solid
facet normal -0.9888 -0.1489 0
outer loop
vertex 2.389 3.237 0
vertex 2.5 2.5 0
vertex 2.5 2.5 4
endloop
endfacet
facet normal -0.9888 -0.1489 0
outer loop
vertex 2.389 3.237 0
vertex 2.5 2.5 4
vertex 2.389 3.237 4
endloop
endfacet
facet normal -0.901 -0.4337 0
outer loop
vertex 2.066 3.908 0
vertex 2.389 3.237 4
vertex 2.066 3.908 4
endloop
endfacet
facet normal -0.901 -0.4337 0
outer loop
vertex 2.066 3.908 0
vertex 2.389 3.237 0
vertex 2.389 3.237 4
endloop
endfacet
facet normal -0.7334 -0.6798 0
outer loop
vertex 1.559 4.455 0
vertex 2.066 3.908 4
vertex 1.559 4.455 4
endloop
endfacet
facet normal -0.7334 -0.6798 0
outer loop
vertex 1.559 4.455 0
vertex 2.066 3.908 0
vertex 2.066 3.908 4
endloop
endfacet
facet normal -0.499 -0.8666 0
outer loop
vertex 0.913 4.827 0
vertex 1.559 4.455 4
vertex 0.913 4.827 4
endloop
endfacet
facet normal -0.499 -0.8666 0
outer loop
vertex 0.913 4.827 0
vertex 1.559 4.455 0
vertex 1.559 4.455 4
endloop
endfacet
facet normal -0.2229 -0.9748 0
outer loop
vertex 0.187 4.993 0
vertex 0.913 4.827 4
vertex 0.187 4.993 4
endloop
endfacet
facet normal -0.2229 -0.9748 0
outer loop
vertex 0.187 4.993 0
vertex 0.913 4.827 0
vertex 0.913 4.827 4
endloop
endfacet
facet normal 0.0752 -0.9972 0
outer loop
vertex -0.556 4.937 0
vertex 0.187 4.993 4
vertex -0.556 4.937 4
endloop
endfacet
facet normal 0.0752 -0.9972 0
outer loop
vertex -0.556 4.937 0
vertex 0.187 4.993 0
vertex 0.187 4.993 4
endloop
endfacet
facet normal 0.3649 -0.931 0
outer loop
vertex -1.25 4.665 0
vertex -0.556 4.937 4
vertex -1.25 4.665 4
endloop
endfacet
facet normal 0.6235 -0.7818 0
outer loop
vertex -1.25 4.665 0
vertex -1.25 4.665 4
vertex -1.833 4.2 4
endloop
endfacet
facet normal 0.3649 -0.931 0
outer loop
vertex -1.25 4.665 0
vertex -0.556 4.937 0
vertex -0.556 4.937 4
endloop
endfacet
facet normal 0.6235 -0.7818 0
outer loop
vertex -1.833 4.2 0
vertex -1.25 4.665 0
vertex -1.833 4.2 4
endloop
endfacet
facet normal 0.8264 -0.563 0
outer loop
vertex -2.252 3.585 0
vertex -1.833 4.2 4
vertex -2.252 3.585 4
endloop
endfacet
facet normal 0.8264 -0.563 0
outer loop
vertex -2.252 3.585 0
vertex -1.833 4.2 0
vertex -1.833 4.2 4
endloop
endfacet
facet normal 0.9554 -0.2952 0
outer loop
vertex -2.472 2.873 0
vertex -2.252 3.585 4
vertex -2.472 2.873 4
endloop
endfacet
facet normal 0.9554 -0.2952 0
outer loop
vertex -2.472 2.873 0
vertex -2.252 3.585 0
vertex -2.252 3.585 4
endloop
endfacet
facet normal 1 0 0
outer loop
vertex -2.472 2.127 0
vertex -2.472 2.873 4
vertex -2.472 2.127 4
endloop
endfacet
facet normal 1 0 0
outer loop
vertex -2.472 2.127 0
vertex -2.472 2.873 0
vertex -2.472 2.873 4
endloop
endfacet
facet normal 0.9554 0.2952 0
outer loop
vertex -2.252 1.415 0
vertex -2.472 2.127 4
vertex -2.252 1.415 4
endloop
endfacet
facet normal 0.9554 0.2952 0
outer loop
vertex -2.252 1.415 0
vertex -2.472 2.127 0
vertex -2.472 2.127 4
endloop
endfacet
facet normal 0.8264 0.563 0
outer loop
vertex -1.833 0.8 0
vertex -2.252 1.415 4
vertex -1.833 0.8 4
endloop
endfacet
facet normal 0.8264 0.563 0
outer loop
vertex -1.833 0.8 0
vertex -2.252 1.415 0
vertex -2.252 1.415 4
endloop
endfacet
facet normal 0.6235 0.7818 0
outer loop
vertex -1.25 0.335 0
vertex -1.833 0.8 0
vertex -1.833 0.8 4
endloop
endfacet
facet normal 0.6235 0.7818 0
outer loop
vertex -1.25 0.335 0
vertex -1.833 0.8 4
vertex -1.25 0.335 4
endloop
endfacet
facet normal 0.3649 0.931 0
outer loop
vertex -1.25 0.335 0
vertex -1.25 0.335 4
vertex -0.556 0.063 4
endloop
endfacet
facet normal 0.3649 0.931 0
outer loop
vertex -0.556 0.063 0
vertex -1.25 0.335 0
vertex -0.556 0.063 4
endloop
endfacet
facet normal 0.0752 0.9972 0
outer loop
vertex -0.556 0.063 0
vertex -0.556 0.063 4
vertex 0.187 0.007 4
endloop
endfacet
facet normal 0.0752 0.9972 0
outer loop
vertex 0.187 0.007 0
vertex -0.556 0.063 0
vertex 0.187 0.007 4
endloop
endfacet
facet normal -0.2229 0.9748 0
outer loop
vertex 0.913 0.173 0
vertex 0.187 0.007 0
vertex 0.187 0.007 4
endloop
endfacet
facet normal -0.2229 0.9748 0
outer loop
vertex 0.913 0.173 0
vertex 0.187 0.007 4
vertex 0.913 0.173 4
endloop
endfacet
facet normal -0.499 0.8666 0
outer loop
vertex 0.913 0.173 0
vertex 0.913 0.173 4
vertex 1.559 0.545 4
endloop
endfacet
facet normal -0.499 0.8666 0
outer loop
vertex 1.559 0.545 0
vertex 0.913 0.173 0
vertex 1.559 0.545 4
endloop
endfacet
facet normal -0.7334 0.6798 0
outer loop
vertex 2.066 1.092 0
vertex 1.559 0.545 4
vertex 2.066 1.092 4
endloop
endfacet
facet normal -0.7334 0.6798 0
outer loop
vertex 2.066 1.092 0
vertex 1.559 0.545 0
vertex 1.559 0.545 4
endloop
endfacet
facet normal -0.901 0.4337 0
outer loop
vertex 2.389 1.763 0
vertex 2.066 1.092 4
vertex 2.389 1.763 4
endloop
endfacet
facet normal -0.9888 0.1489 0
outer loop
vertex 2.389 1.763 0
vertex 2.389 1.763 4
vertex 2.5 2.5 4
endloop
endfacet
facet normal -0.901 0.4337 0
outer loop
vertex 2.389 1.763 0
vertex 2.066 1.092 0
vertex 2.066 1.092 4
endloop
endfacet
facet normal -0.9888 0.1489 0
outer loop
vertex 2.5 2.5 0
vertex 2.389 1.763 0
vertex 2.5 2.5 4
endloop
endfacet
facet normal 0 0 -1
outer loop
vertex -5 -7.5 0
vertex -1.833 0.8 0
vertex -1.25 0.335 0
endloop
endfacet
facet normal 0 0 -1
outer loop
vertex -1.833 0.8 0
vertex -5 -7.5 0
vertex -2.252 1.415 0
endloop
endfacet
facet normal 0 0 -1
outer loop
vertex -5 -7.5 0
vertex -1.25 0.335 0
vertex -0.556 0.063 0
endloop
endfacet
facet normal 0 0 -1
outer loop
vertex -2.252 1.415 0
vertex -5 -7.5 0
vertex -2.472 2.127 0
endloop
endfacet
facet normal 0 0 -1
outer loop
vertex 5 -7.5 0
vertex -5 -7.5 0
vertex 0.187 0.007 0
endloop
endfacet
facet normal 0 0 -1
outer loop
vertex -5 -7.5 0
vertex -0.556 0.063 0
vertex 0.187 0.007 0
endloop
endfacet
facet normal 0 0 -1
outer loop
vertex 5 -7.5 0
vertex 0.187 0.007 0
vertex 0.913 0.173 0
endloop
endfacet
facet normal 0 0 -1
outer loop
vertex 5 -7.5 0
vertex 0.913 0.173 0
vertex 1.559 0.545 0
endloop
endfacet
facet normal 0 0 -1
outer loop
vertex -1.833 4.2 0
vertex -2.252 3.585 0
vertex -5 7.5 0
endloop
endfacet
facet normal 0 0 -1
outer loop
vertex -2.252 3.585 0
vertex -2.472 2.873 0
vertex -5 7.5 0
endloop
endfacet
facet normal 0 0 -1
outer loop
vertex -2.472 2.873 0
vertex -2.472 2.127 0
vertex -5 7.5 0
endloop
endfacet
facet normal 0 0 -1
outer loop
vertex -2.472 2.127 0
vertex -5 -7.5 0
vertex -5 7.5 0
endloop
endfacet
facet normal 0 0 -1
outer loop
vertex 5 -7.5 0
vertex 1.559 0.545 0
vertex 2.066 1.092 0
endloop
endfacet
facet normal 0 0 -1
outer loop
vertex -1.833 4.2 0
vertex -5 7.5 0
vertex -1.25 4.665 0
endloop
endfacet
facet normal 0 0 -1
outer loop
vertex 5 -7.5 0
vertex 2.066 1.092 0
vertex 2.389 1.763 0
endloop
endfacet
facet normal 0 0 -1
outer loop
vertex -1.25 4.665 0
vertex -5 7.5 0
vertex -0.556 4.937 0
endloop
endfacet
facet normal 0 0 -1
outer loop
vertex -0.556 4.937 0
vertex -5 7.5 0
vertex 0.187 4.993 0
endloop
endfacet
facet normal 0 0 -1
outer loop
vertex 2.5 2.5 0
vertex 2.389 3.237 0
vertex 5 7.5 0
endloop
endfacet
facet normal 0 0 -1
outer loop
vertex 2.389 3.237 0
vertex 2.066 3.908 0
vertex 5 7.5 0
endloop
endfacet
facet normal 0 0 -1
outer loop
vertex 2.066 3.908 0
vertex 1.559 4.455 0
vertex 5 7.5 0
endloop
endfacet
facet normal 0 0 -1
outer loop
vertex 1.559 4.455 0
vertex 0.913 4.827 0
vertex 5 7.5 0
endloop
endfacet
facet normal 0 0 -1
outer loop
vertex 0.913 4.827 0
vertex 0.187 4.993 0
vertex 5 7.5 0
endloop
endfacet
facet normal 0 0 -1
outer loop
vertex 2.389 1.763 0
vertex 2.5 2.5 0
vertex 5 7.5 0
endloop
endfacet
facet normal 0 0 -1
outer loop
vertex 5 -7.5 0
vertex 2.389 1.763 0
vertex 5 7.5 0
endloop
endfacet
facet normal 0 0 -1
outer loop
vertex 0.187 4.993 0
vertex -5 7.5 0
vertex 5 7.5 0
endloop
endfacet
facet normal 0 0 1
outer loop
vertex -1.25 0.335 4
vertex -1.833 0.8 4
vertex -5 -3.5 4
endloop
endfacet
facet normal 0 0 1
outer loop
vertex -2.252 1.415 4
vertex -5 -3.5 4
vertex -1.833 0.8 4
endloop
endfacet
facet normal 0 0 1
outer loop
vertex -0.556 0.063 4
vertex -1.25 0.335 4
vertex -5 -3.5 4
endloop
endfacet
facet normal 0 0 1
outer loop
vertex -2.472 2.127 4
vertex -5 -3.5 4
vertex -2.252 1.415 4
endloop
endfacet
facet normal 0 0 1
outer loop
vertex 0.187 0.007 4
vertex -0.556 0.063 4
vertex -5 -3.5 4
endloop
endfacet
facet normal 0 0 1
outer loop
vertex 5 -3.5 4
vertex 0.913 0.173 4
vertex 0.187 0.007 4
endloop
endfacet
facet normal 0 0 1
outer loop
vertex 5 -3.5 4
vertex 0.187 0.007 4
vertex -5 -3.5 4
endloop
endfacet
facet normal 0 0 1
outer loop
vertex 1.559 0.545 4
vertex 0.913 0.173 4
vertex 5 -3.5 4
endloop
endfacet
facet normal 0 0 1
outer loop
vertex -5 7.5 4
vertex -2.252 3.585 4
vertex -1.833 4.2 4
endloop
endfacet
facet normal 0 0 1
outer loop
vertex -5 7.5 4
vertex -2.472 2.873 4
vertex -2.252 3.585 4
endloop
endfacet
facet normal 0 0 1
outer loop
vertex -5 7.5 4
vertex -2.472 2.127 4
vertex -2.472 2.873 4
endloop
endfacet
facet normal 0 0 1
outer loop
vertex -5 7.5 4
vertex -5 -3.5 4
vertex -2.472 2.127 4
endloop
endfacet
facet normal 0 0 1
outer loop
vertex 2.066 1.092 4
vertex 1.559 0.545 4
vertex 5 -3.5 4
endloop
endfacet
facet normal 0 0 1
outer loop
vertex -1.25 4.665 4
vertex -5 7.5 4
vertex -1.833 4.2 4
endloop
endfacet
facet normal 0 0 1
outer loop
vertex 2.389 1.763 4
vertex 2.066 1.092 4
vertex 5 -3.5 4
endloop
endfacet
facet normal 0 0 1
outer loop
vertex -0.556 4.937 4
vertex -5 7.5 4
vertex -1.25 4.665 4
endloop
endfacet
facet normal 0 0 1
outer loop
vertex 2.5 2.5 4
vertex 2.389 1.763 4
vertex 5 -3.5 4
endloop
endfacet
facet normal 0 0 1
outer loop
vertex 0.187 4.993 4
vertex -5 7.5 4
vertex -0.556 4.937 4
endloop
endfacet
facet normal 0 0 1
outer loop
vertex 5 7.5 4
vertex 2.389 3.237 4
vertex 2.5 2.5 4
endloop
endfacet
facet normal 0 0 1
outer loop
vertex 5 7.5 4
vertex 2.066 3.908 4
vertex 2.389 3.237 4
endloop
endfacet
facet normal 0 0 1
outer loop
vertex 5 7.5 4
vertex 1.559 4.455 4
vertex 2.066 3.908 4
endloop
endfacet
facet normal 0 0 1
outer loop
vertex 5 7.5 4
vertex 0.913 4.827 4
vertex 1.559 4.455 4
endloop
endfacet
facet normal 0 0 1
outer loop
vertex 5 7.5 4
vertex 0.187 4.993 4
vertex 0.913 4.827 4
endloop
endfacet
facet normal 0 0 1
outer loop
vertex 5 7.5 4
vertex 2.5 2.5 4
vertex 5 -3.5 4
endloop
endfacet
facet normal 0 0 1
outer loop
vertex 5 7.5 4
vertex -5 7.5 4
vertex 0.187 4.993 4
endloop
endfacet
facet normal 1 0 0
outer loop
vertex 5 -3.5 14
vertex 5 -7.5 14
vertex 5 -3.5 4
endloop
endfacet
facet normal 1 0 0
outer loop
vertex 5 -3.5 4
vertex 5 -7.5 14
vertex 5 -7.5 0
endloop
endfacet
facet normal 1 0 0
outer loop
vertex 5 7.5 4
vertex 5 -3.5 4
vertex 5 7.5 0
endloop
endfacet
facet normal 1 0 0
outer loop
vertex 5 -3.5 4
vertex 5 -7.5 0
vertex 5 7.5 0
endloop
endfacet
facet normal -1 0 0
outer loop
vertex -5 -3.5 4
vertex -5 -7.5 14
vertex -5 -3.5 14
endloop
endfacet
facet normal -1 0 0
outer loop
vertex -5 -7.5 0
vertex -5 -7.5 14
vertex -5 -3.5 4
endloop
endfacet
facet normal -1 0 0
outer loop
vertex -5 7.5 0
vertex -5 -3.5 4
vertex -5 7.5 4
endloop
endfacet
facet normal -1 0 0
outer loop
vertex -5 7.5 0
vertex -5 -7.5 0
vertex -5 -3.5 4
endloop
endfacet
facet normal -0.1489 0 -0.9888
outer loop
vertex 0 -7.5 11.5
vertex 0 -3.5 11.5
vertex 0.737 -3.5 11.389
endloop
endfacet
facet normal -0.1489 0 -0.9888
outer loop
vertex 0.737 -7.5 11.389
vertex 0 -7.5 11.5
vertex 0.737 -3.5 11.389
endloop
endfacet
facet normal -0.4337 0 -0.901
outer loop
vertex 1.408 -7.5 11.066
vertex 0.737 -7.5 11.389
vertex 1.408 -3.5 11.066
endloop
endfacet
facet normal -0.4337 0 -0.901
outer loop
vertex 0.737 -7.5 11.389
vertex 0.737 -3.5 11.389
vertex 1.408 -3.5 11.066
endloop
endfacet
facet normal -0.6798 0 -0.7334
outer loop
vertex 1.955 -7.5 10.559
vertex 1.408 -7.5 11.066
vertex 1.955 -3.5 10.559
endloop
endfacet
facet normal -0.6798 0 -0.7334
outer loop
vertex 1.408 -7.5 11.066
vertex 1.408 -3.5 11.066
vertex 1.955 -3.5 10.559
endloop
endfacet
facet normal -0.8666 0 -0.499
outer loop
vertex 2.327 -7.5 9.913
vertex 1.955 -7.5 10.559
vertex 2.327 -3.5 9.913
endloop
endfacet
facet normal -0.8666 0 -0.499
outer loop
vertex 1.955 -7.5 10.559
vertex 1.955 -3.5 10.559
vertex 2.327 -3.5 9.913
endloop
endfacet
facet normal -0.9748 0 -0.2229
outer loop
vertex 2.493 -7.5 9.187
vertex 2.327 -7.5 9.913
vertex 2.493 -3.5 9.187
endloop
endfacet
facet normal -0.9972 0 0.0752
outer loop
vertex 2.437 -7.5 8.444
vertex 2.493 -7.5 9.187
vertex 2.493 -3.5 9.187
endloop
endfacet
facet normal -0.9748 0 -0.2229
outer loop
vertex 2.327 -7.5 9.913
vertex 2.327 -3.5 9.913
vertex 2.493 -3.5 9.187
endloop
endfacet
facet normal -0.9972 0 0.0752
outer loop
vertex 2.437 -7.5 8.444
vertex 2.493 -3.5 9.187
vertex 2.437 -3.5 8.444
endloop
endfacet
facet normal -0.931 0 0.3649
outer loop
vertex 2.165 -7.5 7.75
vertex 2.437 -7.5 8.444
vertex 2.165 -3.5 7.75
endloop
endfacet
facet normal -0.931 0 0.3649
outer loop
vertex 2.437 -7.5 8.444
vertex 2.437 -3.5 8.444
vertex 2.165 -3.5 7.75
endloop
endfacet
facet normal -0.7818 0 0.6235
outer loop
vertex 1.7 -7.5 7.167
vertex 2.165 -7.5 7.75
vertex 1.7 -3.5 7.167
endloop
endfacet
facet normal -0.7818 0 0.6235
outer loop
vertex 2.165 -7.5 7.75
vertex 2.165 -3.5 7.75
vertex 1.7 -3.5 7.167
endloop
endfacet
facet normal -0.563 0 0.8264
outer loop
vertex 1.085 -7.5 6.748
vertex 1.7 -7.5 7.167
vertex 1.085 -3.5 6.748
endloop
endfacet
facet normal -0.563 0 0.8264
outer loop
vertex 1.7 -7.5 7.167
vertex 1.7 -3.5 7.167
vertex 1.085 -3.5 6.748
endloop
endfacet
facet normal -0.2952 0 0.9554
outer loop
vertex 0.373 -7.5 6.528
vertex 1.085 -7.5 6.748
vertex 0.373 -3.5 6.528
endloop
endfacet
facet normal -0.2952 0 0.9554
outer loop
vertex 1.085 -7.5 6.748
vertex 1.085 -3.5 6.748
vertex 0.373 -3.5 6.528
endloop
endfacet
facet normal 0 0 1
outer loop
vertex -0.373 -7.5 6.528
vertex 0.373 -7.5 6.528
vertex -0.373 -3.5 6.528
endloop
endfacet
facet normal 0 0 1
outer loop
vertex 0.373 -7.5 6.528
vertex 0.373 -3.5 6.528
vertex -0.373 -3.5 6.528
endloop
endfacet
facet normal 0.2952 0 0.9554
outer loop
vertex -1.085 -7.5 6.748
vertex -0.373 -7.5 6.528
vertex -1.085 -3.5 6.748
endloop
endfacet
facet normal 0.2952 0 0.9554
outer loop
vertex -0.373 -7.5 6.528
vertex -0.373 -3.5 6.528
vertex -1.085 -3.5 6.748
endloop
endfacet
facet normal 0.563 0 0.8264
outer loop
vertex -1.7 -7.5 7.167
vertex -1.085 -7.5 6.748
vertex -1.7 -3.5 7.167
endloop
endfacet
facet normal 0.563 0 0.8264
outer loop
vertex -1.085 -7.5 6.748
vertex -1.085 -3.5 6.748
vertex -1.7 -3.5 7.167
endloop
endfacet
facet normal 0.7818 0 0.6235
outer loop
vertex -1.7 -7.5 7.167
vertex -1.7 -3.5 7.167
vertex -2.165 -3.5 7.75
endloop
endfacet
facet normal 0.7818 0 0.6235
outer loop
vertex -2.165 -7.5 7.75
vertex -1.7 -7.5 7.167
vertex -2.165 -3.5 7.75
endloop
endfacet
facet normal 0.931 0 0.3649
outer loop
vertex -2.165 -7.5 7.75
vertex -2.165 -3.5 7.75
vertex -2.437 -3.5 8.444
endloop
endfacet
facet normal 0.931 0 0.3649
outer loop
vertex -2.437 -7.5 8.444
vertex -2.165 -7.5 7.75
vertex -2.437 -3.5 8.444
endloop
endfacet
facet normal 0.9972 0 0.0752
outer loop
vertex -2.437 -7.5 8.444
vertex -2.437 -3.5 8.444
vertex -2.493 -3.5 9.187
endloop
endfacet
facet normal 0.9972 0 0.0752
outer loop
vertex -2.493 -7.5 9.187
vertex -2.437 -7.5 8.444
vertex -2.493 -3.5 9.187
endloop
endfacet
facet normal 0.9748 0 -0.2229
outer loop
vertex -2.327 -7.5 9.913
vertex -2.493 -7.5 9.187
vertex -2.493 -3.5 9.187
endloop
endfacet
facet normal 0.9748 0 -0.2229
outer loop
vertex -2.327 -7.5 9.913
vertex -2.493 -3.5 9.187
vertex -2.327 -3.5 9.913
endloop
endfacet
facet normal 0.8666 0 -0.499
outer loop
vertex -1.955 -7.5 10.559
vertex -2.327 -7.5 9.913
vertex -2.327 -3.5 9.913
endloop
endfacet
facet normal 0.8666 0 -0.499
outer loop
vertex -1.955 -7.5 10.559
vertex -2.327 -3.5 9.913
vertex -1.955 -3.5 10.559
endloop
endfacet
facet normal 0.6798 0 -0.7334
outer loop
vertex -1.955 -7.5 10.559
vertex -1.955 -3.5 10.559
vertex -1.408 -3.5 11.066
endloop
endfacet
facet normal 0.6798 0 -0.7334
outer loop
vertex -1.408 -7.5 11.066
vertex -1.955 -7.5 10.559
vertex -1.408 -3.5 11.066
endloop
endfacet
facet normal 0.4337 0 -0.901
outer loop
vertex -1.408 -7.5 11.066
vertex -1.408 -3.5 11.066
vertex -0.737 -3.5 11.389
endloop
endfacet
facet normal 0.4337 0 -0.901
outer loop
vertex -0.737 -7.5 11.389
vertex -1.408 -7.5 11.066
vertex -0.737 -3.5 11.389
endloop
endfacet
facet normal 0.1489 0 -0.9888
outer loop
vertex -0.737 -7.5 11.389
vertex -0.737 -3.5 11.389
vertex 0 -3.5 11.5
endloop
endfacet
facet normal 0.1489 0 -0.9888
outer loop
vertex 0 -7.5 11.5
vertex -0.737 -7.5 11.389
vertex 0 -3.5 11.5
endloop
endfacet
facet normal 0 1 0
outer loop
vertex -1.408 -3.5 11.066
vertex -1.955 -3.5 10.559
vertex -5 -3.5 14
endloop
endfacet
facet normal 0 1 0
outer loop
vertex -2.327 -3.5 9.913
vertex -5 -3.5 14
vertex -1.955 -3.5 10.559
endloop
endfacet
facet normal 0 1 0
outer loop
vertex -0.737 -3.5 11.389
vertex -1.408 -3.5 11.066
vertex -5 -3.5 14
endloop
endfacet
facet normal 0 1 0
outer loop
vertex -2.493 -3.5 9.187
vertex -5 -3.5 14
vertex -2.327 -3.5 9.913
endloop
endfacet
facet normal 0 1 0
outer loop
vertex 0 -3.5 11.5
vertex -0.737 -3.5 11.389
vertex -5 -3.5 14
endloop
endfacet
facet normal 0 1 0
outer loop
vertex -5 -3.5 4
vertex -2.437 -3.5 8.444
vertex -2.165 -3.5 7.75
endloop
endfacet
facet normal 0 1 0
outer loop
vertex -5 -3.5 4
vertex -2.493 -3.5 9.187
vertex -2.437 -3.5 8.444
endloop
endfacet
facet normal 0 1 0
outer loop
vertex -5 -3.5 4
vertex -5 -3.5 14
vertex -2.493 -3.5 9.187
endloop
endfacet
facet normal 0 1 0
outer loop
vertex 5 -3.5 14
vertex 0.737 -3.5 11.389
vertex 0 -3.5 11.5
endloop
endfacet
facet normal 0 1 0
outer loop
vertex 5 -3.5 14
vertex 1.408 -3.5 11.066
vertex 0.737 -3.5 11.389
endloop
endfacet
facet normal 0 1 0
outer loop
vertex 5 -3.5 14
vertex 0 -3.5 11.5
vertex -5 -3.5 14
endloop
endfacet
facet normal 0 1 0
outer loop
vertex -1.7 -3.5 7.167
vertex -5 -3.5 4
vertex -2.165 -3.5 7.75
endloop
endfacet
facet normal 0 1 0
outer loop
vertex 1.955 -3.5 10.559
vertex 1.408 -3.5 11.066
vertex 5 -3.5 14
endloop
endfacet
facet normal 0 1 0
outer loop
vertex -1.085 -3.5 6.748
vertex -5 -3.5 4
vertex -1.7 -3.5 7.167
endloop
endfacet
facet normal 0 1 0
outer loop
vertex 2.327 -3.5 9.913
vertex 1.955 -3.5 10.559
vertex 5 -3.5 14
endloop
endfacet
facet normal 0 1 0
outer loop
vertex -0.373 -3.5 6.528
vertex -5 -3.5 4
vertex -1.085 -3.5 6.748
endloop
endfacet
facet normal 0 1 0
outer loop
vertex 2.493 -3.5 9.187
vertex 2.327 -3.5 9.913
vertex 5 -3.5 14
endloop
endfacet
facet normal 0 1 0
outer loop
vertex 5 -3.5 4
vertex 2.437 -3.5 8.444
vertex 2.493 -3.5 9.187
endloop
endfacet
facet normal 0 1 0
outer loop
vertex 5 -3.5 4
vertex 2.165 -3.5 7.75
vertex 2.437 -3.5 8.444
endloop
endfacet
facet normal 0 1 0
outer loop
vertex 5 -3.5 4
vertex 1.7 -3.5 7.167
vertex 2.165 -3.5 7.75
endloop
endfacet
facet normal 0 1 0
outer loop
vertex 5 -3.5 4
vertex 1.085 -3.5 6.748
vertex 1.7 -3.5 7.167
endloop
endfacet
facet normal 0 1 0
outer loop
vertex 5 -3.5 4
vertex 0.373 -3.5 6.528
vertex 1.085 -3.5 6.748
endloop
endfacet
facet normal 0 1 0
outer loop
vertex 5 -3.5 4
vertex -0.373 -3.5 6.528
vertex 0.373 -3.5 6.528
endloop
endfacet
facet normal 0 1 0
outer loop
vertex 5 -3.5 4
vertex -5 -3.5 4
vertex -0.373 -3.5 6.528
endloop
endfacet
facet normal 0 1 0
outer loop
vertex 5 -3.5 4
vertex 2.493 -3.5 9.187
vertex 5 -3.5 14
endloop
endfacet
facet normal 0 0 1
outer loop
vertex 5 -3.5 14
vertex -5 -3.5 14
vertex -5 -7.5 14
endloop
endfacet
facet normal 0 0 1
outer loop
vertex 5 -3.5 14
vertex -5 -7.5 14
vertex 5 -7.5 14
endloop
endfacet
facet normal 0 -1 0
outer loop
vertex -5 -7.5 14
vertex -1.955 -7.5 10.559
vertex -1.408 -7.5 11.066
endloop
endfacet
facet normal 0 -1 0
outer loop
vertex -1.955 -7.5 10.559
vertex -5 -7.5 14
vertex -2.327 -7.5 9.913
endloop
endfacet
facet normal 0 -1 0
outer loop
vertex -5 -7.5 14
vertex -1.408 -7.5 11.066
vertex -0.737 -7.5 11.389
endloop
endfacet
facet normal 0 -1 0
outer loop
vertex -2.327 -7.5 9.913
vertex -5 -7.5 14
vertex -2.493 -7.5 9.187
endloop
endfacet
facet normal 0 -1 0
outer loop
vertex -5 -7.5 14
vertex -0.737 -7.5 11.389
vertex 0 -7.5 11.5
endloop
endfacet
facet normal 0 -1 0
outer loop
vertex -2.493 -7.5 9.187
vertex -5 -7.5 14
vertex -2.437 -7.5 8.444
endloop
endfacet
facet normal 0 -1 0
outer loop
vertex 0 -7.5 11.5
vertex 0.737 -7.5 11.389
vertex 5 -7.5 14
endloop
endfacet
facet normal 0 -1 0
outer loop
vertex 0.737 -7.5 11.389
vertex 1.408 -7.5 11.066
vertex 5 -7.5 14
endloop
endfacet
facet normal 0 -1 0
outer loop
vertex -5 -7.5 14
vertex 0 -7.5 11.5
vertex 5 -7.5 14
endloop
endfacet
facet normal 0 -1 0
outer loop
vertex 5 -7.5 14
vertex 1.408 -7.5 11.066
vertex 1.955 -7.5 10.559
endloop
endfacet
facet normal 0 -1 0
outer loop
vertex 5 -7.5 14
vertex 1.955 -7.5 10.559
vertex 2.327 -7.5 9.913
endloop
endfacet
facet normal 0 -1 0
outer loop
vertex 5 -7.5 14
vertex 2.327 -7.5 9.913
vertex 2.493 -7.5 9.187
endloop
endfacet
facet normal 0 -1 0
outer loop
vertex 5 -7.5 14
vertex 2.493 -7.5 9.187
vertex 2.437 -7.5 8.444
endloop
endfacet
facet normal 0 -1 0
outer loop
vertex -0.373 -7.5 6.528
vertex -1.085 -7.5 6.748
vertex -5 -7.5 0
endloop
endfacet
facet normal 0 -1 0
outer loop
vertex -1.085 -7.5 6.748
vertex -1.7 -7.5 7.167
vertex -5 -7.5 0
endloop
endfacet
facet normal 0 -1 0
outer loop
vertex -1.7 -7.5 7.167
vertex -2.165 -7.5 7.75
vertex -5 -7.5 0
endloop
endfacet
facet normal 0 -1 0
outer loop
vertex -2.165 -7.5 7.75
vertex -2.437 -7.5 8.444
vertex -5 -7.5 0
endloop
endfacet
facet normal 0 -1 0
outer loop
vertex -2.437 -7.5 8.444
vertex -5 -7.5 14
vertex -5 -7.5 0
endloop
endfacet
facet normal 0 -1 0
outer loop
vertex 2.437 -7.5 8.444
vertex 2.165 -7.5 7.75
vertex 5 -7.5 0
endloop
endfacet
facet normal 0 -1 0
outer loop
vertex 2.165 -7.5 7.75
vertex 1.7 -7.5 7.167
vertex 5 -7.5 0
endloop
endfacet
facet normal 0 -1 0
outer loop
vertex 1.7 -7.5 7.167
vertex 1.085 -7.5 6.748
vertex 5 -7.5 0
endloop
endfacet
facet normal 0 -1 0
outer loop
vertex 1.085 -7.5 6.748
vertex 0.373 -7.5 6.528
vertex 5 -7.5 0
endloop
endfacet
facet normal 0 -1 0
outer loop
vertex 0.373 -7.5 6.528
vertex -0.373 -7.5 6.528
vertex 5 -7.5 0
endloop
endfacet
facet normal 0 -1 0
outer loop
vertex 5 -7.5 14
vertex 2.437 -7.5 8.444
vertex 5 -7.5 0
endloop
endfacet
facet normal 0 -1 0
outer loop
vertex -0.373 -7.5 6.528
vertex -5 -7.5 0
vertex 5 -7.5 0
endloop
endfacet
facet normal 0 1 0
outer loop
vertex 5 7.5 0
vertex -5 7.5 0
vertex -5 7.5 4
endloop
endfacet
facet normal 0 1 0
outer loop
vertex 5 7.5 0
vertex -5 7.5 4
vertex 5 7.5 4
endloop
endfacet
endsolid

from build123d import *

# Parameters (mm, degrees)
SKETCH1_W           = 10
SKETCH1_H           = 15
SKETCH1_R           = 2.5
BOSS_EXTRUDE1_DEPTH = 4
SKETCH2_W           = 10
SKETCH2_H           = 4
BOSS_EXTRUDE2_DEPTH = 10
SKETCH3_R           = 2.5
CUT_EXTRUDE1_DEPTH  = 10


with BuildPart() as part:
    # Sketch1 → Boss-Extrude1 (new body)
    with BuildSketch(Plane.XY):
        Rectangle(SKETCH1_W, SKETCH1_H)
        with Locations((0, 2.5)):
            Circle(SKETCH1_R, mode=Mode.SUBTRACT)
    extrude(amount=BOSS_EXTRUDE1_DEPTH)

    # Sketch2 → Boss-Extrude2 (add)
    with BuildSketch(Plane.XY.offset(4)):
        with Locations((0, -5.5)):
            Rectangle(SKETCH2_W, SKETCH2_H)
    extrude(amount=BOSS_EXTRUDE2_DEPTH)

    # Sketch3 → Cut-Extrude1 (cut)
    with BuildSketch(Plane(origin=(0, -3.5, 0), x_dir=(1, 0, 0), z_dir=(0, 1, 0))):
        with Locations(Location((0, -9, 0), (0, 0, 270))):
            Circle(SKETCH3_R)
    extrude(amount=-CUT_EXTRUDE1_DEPTH, mode=Mode.SUBTRACT)


solid = part.part
